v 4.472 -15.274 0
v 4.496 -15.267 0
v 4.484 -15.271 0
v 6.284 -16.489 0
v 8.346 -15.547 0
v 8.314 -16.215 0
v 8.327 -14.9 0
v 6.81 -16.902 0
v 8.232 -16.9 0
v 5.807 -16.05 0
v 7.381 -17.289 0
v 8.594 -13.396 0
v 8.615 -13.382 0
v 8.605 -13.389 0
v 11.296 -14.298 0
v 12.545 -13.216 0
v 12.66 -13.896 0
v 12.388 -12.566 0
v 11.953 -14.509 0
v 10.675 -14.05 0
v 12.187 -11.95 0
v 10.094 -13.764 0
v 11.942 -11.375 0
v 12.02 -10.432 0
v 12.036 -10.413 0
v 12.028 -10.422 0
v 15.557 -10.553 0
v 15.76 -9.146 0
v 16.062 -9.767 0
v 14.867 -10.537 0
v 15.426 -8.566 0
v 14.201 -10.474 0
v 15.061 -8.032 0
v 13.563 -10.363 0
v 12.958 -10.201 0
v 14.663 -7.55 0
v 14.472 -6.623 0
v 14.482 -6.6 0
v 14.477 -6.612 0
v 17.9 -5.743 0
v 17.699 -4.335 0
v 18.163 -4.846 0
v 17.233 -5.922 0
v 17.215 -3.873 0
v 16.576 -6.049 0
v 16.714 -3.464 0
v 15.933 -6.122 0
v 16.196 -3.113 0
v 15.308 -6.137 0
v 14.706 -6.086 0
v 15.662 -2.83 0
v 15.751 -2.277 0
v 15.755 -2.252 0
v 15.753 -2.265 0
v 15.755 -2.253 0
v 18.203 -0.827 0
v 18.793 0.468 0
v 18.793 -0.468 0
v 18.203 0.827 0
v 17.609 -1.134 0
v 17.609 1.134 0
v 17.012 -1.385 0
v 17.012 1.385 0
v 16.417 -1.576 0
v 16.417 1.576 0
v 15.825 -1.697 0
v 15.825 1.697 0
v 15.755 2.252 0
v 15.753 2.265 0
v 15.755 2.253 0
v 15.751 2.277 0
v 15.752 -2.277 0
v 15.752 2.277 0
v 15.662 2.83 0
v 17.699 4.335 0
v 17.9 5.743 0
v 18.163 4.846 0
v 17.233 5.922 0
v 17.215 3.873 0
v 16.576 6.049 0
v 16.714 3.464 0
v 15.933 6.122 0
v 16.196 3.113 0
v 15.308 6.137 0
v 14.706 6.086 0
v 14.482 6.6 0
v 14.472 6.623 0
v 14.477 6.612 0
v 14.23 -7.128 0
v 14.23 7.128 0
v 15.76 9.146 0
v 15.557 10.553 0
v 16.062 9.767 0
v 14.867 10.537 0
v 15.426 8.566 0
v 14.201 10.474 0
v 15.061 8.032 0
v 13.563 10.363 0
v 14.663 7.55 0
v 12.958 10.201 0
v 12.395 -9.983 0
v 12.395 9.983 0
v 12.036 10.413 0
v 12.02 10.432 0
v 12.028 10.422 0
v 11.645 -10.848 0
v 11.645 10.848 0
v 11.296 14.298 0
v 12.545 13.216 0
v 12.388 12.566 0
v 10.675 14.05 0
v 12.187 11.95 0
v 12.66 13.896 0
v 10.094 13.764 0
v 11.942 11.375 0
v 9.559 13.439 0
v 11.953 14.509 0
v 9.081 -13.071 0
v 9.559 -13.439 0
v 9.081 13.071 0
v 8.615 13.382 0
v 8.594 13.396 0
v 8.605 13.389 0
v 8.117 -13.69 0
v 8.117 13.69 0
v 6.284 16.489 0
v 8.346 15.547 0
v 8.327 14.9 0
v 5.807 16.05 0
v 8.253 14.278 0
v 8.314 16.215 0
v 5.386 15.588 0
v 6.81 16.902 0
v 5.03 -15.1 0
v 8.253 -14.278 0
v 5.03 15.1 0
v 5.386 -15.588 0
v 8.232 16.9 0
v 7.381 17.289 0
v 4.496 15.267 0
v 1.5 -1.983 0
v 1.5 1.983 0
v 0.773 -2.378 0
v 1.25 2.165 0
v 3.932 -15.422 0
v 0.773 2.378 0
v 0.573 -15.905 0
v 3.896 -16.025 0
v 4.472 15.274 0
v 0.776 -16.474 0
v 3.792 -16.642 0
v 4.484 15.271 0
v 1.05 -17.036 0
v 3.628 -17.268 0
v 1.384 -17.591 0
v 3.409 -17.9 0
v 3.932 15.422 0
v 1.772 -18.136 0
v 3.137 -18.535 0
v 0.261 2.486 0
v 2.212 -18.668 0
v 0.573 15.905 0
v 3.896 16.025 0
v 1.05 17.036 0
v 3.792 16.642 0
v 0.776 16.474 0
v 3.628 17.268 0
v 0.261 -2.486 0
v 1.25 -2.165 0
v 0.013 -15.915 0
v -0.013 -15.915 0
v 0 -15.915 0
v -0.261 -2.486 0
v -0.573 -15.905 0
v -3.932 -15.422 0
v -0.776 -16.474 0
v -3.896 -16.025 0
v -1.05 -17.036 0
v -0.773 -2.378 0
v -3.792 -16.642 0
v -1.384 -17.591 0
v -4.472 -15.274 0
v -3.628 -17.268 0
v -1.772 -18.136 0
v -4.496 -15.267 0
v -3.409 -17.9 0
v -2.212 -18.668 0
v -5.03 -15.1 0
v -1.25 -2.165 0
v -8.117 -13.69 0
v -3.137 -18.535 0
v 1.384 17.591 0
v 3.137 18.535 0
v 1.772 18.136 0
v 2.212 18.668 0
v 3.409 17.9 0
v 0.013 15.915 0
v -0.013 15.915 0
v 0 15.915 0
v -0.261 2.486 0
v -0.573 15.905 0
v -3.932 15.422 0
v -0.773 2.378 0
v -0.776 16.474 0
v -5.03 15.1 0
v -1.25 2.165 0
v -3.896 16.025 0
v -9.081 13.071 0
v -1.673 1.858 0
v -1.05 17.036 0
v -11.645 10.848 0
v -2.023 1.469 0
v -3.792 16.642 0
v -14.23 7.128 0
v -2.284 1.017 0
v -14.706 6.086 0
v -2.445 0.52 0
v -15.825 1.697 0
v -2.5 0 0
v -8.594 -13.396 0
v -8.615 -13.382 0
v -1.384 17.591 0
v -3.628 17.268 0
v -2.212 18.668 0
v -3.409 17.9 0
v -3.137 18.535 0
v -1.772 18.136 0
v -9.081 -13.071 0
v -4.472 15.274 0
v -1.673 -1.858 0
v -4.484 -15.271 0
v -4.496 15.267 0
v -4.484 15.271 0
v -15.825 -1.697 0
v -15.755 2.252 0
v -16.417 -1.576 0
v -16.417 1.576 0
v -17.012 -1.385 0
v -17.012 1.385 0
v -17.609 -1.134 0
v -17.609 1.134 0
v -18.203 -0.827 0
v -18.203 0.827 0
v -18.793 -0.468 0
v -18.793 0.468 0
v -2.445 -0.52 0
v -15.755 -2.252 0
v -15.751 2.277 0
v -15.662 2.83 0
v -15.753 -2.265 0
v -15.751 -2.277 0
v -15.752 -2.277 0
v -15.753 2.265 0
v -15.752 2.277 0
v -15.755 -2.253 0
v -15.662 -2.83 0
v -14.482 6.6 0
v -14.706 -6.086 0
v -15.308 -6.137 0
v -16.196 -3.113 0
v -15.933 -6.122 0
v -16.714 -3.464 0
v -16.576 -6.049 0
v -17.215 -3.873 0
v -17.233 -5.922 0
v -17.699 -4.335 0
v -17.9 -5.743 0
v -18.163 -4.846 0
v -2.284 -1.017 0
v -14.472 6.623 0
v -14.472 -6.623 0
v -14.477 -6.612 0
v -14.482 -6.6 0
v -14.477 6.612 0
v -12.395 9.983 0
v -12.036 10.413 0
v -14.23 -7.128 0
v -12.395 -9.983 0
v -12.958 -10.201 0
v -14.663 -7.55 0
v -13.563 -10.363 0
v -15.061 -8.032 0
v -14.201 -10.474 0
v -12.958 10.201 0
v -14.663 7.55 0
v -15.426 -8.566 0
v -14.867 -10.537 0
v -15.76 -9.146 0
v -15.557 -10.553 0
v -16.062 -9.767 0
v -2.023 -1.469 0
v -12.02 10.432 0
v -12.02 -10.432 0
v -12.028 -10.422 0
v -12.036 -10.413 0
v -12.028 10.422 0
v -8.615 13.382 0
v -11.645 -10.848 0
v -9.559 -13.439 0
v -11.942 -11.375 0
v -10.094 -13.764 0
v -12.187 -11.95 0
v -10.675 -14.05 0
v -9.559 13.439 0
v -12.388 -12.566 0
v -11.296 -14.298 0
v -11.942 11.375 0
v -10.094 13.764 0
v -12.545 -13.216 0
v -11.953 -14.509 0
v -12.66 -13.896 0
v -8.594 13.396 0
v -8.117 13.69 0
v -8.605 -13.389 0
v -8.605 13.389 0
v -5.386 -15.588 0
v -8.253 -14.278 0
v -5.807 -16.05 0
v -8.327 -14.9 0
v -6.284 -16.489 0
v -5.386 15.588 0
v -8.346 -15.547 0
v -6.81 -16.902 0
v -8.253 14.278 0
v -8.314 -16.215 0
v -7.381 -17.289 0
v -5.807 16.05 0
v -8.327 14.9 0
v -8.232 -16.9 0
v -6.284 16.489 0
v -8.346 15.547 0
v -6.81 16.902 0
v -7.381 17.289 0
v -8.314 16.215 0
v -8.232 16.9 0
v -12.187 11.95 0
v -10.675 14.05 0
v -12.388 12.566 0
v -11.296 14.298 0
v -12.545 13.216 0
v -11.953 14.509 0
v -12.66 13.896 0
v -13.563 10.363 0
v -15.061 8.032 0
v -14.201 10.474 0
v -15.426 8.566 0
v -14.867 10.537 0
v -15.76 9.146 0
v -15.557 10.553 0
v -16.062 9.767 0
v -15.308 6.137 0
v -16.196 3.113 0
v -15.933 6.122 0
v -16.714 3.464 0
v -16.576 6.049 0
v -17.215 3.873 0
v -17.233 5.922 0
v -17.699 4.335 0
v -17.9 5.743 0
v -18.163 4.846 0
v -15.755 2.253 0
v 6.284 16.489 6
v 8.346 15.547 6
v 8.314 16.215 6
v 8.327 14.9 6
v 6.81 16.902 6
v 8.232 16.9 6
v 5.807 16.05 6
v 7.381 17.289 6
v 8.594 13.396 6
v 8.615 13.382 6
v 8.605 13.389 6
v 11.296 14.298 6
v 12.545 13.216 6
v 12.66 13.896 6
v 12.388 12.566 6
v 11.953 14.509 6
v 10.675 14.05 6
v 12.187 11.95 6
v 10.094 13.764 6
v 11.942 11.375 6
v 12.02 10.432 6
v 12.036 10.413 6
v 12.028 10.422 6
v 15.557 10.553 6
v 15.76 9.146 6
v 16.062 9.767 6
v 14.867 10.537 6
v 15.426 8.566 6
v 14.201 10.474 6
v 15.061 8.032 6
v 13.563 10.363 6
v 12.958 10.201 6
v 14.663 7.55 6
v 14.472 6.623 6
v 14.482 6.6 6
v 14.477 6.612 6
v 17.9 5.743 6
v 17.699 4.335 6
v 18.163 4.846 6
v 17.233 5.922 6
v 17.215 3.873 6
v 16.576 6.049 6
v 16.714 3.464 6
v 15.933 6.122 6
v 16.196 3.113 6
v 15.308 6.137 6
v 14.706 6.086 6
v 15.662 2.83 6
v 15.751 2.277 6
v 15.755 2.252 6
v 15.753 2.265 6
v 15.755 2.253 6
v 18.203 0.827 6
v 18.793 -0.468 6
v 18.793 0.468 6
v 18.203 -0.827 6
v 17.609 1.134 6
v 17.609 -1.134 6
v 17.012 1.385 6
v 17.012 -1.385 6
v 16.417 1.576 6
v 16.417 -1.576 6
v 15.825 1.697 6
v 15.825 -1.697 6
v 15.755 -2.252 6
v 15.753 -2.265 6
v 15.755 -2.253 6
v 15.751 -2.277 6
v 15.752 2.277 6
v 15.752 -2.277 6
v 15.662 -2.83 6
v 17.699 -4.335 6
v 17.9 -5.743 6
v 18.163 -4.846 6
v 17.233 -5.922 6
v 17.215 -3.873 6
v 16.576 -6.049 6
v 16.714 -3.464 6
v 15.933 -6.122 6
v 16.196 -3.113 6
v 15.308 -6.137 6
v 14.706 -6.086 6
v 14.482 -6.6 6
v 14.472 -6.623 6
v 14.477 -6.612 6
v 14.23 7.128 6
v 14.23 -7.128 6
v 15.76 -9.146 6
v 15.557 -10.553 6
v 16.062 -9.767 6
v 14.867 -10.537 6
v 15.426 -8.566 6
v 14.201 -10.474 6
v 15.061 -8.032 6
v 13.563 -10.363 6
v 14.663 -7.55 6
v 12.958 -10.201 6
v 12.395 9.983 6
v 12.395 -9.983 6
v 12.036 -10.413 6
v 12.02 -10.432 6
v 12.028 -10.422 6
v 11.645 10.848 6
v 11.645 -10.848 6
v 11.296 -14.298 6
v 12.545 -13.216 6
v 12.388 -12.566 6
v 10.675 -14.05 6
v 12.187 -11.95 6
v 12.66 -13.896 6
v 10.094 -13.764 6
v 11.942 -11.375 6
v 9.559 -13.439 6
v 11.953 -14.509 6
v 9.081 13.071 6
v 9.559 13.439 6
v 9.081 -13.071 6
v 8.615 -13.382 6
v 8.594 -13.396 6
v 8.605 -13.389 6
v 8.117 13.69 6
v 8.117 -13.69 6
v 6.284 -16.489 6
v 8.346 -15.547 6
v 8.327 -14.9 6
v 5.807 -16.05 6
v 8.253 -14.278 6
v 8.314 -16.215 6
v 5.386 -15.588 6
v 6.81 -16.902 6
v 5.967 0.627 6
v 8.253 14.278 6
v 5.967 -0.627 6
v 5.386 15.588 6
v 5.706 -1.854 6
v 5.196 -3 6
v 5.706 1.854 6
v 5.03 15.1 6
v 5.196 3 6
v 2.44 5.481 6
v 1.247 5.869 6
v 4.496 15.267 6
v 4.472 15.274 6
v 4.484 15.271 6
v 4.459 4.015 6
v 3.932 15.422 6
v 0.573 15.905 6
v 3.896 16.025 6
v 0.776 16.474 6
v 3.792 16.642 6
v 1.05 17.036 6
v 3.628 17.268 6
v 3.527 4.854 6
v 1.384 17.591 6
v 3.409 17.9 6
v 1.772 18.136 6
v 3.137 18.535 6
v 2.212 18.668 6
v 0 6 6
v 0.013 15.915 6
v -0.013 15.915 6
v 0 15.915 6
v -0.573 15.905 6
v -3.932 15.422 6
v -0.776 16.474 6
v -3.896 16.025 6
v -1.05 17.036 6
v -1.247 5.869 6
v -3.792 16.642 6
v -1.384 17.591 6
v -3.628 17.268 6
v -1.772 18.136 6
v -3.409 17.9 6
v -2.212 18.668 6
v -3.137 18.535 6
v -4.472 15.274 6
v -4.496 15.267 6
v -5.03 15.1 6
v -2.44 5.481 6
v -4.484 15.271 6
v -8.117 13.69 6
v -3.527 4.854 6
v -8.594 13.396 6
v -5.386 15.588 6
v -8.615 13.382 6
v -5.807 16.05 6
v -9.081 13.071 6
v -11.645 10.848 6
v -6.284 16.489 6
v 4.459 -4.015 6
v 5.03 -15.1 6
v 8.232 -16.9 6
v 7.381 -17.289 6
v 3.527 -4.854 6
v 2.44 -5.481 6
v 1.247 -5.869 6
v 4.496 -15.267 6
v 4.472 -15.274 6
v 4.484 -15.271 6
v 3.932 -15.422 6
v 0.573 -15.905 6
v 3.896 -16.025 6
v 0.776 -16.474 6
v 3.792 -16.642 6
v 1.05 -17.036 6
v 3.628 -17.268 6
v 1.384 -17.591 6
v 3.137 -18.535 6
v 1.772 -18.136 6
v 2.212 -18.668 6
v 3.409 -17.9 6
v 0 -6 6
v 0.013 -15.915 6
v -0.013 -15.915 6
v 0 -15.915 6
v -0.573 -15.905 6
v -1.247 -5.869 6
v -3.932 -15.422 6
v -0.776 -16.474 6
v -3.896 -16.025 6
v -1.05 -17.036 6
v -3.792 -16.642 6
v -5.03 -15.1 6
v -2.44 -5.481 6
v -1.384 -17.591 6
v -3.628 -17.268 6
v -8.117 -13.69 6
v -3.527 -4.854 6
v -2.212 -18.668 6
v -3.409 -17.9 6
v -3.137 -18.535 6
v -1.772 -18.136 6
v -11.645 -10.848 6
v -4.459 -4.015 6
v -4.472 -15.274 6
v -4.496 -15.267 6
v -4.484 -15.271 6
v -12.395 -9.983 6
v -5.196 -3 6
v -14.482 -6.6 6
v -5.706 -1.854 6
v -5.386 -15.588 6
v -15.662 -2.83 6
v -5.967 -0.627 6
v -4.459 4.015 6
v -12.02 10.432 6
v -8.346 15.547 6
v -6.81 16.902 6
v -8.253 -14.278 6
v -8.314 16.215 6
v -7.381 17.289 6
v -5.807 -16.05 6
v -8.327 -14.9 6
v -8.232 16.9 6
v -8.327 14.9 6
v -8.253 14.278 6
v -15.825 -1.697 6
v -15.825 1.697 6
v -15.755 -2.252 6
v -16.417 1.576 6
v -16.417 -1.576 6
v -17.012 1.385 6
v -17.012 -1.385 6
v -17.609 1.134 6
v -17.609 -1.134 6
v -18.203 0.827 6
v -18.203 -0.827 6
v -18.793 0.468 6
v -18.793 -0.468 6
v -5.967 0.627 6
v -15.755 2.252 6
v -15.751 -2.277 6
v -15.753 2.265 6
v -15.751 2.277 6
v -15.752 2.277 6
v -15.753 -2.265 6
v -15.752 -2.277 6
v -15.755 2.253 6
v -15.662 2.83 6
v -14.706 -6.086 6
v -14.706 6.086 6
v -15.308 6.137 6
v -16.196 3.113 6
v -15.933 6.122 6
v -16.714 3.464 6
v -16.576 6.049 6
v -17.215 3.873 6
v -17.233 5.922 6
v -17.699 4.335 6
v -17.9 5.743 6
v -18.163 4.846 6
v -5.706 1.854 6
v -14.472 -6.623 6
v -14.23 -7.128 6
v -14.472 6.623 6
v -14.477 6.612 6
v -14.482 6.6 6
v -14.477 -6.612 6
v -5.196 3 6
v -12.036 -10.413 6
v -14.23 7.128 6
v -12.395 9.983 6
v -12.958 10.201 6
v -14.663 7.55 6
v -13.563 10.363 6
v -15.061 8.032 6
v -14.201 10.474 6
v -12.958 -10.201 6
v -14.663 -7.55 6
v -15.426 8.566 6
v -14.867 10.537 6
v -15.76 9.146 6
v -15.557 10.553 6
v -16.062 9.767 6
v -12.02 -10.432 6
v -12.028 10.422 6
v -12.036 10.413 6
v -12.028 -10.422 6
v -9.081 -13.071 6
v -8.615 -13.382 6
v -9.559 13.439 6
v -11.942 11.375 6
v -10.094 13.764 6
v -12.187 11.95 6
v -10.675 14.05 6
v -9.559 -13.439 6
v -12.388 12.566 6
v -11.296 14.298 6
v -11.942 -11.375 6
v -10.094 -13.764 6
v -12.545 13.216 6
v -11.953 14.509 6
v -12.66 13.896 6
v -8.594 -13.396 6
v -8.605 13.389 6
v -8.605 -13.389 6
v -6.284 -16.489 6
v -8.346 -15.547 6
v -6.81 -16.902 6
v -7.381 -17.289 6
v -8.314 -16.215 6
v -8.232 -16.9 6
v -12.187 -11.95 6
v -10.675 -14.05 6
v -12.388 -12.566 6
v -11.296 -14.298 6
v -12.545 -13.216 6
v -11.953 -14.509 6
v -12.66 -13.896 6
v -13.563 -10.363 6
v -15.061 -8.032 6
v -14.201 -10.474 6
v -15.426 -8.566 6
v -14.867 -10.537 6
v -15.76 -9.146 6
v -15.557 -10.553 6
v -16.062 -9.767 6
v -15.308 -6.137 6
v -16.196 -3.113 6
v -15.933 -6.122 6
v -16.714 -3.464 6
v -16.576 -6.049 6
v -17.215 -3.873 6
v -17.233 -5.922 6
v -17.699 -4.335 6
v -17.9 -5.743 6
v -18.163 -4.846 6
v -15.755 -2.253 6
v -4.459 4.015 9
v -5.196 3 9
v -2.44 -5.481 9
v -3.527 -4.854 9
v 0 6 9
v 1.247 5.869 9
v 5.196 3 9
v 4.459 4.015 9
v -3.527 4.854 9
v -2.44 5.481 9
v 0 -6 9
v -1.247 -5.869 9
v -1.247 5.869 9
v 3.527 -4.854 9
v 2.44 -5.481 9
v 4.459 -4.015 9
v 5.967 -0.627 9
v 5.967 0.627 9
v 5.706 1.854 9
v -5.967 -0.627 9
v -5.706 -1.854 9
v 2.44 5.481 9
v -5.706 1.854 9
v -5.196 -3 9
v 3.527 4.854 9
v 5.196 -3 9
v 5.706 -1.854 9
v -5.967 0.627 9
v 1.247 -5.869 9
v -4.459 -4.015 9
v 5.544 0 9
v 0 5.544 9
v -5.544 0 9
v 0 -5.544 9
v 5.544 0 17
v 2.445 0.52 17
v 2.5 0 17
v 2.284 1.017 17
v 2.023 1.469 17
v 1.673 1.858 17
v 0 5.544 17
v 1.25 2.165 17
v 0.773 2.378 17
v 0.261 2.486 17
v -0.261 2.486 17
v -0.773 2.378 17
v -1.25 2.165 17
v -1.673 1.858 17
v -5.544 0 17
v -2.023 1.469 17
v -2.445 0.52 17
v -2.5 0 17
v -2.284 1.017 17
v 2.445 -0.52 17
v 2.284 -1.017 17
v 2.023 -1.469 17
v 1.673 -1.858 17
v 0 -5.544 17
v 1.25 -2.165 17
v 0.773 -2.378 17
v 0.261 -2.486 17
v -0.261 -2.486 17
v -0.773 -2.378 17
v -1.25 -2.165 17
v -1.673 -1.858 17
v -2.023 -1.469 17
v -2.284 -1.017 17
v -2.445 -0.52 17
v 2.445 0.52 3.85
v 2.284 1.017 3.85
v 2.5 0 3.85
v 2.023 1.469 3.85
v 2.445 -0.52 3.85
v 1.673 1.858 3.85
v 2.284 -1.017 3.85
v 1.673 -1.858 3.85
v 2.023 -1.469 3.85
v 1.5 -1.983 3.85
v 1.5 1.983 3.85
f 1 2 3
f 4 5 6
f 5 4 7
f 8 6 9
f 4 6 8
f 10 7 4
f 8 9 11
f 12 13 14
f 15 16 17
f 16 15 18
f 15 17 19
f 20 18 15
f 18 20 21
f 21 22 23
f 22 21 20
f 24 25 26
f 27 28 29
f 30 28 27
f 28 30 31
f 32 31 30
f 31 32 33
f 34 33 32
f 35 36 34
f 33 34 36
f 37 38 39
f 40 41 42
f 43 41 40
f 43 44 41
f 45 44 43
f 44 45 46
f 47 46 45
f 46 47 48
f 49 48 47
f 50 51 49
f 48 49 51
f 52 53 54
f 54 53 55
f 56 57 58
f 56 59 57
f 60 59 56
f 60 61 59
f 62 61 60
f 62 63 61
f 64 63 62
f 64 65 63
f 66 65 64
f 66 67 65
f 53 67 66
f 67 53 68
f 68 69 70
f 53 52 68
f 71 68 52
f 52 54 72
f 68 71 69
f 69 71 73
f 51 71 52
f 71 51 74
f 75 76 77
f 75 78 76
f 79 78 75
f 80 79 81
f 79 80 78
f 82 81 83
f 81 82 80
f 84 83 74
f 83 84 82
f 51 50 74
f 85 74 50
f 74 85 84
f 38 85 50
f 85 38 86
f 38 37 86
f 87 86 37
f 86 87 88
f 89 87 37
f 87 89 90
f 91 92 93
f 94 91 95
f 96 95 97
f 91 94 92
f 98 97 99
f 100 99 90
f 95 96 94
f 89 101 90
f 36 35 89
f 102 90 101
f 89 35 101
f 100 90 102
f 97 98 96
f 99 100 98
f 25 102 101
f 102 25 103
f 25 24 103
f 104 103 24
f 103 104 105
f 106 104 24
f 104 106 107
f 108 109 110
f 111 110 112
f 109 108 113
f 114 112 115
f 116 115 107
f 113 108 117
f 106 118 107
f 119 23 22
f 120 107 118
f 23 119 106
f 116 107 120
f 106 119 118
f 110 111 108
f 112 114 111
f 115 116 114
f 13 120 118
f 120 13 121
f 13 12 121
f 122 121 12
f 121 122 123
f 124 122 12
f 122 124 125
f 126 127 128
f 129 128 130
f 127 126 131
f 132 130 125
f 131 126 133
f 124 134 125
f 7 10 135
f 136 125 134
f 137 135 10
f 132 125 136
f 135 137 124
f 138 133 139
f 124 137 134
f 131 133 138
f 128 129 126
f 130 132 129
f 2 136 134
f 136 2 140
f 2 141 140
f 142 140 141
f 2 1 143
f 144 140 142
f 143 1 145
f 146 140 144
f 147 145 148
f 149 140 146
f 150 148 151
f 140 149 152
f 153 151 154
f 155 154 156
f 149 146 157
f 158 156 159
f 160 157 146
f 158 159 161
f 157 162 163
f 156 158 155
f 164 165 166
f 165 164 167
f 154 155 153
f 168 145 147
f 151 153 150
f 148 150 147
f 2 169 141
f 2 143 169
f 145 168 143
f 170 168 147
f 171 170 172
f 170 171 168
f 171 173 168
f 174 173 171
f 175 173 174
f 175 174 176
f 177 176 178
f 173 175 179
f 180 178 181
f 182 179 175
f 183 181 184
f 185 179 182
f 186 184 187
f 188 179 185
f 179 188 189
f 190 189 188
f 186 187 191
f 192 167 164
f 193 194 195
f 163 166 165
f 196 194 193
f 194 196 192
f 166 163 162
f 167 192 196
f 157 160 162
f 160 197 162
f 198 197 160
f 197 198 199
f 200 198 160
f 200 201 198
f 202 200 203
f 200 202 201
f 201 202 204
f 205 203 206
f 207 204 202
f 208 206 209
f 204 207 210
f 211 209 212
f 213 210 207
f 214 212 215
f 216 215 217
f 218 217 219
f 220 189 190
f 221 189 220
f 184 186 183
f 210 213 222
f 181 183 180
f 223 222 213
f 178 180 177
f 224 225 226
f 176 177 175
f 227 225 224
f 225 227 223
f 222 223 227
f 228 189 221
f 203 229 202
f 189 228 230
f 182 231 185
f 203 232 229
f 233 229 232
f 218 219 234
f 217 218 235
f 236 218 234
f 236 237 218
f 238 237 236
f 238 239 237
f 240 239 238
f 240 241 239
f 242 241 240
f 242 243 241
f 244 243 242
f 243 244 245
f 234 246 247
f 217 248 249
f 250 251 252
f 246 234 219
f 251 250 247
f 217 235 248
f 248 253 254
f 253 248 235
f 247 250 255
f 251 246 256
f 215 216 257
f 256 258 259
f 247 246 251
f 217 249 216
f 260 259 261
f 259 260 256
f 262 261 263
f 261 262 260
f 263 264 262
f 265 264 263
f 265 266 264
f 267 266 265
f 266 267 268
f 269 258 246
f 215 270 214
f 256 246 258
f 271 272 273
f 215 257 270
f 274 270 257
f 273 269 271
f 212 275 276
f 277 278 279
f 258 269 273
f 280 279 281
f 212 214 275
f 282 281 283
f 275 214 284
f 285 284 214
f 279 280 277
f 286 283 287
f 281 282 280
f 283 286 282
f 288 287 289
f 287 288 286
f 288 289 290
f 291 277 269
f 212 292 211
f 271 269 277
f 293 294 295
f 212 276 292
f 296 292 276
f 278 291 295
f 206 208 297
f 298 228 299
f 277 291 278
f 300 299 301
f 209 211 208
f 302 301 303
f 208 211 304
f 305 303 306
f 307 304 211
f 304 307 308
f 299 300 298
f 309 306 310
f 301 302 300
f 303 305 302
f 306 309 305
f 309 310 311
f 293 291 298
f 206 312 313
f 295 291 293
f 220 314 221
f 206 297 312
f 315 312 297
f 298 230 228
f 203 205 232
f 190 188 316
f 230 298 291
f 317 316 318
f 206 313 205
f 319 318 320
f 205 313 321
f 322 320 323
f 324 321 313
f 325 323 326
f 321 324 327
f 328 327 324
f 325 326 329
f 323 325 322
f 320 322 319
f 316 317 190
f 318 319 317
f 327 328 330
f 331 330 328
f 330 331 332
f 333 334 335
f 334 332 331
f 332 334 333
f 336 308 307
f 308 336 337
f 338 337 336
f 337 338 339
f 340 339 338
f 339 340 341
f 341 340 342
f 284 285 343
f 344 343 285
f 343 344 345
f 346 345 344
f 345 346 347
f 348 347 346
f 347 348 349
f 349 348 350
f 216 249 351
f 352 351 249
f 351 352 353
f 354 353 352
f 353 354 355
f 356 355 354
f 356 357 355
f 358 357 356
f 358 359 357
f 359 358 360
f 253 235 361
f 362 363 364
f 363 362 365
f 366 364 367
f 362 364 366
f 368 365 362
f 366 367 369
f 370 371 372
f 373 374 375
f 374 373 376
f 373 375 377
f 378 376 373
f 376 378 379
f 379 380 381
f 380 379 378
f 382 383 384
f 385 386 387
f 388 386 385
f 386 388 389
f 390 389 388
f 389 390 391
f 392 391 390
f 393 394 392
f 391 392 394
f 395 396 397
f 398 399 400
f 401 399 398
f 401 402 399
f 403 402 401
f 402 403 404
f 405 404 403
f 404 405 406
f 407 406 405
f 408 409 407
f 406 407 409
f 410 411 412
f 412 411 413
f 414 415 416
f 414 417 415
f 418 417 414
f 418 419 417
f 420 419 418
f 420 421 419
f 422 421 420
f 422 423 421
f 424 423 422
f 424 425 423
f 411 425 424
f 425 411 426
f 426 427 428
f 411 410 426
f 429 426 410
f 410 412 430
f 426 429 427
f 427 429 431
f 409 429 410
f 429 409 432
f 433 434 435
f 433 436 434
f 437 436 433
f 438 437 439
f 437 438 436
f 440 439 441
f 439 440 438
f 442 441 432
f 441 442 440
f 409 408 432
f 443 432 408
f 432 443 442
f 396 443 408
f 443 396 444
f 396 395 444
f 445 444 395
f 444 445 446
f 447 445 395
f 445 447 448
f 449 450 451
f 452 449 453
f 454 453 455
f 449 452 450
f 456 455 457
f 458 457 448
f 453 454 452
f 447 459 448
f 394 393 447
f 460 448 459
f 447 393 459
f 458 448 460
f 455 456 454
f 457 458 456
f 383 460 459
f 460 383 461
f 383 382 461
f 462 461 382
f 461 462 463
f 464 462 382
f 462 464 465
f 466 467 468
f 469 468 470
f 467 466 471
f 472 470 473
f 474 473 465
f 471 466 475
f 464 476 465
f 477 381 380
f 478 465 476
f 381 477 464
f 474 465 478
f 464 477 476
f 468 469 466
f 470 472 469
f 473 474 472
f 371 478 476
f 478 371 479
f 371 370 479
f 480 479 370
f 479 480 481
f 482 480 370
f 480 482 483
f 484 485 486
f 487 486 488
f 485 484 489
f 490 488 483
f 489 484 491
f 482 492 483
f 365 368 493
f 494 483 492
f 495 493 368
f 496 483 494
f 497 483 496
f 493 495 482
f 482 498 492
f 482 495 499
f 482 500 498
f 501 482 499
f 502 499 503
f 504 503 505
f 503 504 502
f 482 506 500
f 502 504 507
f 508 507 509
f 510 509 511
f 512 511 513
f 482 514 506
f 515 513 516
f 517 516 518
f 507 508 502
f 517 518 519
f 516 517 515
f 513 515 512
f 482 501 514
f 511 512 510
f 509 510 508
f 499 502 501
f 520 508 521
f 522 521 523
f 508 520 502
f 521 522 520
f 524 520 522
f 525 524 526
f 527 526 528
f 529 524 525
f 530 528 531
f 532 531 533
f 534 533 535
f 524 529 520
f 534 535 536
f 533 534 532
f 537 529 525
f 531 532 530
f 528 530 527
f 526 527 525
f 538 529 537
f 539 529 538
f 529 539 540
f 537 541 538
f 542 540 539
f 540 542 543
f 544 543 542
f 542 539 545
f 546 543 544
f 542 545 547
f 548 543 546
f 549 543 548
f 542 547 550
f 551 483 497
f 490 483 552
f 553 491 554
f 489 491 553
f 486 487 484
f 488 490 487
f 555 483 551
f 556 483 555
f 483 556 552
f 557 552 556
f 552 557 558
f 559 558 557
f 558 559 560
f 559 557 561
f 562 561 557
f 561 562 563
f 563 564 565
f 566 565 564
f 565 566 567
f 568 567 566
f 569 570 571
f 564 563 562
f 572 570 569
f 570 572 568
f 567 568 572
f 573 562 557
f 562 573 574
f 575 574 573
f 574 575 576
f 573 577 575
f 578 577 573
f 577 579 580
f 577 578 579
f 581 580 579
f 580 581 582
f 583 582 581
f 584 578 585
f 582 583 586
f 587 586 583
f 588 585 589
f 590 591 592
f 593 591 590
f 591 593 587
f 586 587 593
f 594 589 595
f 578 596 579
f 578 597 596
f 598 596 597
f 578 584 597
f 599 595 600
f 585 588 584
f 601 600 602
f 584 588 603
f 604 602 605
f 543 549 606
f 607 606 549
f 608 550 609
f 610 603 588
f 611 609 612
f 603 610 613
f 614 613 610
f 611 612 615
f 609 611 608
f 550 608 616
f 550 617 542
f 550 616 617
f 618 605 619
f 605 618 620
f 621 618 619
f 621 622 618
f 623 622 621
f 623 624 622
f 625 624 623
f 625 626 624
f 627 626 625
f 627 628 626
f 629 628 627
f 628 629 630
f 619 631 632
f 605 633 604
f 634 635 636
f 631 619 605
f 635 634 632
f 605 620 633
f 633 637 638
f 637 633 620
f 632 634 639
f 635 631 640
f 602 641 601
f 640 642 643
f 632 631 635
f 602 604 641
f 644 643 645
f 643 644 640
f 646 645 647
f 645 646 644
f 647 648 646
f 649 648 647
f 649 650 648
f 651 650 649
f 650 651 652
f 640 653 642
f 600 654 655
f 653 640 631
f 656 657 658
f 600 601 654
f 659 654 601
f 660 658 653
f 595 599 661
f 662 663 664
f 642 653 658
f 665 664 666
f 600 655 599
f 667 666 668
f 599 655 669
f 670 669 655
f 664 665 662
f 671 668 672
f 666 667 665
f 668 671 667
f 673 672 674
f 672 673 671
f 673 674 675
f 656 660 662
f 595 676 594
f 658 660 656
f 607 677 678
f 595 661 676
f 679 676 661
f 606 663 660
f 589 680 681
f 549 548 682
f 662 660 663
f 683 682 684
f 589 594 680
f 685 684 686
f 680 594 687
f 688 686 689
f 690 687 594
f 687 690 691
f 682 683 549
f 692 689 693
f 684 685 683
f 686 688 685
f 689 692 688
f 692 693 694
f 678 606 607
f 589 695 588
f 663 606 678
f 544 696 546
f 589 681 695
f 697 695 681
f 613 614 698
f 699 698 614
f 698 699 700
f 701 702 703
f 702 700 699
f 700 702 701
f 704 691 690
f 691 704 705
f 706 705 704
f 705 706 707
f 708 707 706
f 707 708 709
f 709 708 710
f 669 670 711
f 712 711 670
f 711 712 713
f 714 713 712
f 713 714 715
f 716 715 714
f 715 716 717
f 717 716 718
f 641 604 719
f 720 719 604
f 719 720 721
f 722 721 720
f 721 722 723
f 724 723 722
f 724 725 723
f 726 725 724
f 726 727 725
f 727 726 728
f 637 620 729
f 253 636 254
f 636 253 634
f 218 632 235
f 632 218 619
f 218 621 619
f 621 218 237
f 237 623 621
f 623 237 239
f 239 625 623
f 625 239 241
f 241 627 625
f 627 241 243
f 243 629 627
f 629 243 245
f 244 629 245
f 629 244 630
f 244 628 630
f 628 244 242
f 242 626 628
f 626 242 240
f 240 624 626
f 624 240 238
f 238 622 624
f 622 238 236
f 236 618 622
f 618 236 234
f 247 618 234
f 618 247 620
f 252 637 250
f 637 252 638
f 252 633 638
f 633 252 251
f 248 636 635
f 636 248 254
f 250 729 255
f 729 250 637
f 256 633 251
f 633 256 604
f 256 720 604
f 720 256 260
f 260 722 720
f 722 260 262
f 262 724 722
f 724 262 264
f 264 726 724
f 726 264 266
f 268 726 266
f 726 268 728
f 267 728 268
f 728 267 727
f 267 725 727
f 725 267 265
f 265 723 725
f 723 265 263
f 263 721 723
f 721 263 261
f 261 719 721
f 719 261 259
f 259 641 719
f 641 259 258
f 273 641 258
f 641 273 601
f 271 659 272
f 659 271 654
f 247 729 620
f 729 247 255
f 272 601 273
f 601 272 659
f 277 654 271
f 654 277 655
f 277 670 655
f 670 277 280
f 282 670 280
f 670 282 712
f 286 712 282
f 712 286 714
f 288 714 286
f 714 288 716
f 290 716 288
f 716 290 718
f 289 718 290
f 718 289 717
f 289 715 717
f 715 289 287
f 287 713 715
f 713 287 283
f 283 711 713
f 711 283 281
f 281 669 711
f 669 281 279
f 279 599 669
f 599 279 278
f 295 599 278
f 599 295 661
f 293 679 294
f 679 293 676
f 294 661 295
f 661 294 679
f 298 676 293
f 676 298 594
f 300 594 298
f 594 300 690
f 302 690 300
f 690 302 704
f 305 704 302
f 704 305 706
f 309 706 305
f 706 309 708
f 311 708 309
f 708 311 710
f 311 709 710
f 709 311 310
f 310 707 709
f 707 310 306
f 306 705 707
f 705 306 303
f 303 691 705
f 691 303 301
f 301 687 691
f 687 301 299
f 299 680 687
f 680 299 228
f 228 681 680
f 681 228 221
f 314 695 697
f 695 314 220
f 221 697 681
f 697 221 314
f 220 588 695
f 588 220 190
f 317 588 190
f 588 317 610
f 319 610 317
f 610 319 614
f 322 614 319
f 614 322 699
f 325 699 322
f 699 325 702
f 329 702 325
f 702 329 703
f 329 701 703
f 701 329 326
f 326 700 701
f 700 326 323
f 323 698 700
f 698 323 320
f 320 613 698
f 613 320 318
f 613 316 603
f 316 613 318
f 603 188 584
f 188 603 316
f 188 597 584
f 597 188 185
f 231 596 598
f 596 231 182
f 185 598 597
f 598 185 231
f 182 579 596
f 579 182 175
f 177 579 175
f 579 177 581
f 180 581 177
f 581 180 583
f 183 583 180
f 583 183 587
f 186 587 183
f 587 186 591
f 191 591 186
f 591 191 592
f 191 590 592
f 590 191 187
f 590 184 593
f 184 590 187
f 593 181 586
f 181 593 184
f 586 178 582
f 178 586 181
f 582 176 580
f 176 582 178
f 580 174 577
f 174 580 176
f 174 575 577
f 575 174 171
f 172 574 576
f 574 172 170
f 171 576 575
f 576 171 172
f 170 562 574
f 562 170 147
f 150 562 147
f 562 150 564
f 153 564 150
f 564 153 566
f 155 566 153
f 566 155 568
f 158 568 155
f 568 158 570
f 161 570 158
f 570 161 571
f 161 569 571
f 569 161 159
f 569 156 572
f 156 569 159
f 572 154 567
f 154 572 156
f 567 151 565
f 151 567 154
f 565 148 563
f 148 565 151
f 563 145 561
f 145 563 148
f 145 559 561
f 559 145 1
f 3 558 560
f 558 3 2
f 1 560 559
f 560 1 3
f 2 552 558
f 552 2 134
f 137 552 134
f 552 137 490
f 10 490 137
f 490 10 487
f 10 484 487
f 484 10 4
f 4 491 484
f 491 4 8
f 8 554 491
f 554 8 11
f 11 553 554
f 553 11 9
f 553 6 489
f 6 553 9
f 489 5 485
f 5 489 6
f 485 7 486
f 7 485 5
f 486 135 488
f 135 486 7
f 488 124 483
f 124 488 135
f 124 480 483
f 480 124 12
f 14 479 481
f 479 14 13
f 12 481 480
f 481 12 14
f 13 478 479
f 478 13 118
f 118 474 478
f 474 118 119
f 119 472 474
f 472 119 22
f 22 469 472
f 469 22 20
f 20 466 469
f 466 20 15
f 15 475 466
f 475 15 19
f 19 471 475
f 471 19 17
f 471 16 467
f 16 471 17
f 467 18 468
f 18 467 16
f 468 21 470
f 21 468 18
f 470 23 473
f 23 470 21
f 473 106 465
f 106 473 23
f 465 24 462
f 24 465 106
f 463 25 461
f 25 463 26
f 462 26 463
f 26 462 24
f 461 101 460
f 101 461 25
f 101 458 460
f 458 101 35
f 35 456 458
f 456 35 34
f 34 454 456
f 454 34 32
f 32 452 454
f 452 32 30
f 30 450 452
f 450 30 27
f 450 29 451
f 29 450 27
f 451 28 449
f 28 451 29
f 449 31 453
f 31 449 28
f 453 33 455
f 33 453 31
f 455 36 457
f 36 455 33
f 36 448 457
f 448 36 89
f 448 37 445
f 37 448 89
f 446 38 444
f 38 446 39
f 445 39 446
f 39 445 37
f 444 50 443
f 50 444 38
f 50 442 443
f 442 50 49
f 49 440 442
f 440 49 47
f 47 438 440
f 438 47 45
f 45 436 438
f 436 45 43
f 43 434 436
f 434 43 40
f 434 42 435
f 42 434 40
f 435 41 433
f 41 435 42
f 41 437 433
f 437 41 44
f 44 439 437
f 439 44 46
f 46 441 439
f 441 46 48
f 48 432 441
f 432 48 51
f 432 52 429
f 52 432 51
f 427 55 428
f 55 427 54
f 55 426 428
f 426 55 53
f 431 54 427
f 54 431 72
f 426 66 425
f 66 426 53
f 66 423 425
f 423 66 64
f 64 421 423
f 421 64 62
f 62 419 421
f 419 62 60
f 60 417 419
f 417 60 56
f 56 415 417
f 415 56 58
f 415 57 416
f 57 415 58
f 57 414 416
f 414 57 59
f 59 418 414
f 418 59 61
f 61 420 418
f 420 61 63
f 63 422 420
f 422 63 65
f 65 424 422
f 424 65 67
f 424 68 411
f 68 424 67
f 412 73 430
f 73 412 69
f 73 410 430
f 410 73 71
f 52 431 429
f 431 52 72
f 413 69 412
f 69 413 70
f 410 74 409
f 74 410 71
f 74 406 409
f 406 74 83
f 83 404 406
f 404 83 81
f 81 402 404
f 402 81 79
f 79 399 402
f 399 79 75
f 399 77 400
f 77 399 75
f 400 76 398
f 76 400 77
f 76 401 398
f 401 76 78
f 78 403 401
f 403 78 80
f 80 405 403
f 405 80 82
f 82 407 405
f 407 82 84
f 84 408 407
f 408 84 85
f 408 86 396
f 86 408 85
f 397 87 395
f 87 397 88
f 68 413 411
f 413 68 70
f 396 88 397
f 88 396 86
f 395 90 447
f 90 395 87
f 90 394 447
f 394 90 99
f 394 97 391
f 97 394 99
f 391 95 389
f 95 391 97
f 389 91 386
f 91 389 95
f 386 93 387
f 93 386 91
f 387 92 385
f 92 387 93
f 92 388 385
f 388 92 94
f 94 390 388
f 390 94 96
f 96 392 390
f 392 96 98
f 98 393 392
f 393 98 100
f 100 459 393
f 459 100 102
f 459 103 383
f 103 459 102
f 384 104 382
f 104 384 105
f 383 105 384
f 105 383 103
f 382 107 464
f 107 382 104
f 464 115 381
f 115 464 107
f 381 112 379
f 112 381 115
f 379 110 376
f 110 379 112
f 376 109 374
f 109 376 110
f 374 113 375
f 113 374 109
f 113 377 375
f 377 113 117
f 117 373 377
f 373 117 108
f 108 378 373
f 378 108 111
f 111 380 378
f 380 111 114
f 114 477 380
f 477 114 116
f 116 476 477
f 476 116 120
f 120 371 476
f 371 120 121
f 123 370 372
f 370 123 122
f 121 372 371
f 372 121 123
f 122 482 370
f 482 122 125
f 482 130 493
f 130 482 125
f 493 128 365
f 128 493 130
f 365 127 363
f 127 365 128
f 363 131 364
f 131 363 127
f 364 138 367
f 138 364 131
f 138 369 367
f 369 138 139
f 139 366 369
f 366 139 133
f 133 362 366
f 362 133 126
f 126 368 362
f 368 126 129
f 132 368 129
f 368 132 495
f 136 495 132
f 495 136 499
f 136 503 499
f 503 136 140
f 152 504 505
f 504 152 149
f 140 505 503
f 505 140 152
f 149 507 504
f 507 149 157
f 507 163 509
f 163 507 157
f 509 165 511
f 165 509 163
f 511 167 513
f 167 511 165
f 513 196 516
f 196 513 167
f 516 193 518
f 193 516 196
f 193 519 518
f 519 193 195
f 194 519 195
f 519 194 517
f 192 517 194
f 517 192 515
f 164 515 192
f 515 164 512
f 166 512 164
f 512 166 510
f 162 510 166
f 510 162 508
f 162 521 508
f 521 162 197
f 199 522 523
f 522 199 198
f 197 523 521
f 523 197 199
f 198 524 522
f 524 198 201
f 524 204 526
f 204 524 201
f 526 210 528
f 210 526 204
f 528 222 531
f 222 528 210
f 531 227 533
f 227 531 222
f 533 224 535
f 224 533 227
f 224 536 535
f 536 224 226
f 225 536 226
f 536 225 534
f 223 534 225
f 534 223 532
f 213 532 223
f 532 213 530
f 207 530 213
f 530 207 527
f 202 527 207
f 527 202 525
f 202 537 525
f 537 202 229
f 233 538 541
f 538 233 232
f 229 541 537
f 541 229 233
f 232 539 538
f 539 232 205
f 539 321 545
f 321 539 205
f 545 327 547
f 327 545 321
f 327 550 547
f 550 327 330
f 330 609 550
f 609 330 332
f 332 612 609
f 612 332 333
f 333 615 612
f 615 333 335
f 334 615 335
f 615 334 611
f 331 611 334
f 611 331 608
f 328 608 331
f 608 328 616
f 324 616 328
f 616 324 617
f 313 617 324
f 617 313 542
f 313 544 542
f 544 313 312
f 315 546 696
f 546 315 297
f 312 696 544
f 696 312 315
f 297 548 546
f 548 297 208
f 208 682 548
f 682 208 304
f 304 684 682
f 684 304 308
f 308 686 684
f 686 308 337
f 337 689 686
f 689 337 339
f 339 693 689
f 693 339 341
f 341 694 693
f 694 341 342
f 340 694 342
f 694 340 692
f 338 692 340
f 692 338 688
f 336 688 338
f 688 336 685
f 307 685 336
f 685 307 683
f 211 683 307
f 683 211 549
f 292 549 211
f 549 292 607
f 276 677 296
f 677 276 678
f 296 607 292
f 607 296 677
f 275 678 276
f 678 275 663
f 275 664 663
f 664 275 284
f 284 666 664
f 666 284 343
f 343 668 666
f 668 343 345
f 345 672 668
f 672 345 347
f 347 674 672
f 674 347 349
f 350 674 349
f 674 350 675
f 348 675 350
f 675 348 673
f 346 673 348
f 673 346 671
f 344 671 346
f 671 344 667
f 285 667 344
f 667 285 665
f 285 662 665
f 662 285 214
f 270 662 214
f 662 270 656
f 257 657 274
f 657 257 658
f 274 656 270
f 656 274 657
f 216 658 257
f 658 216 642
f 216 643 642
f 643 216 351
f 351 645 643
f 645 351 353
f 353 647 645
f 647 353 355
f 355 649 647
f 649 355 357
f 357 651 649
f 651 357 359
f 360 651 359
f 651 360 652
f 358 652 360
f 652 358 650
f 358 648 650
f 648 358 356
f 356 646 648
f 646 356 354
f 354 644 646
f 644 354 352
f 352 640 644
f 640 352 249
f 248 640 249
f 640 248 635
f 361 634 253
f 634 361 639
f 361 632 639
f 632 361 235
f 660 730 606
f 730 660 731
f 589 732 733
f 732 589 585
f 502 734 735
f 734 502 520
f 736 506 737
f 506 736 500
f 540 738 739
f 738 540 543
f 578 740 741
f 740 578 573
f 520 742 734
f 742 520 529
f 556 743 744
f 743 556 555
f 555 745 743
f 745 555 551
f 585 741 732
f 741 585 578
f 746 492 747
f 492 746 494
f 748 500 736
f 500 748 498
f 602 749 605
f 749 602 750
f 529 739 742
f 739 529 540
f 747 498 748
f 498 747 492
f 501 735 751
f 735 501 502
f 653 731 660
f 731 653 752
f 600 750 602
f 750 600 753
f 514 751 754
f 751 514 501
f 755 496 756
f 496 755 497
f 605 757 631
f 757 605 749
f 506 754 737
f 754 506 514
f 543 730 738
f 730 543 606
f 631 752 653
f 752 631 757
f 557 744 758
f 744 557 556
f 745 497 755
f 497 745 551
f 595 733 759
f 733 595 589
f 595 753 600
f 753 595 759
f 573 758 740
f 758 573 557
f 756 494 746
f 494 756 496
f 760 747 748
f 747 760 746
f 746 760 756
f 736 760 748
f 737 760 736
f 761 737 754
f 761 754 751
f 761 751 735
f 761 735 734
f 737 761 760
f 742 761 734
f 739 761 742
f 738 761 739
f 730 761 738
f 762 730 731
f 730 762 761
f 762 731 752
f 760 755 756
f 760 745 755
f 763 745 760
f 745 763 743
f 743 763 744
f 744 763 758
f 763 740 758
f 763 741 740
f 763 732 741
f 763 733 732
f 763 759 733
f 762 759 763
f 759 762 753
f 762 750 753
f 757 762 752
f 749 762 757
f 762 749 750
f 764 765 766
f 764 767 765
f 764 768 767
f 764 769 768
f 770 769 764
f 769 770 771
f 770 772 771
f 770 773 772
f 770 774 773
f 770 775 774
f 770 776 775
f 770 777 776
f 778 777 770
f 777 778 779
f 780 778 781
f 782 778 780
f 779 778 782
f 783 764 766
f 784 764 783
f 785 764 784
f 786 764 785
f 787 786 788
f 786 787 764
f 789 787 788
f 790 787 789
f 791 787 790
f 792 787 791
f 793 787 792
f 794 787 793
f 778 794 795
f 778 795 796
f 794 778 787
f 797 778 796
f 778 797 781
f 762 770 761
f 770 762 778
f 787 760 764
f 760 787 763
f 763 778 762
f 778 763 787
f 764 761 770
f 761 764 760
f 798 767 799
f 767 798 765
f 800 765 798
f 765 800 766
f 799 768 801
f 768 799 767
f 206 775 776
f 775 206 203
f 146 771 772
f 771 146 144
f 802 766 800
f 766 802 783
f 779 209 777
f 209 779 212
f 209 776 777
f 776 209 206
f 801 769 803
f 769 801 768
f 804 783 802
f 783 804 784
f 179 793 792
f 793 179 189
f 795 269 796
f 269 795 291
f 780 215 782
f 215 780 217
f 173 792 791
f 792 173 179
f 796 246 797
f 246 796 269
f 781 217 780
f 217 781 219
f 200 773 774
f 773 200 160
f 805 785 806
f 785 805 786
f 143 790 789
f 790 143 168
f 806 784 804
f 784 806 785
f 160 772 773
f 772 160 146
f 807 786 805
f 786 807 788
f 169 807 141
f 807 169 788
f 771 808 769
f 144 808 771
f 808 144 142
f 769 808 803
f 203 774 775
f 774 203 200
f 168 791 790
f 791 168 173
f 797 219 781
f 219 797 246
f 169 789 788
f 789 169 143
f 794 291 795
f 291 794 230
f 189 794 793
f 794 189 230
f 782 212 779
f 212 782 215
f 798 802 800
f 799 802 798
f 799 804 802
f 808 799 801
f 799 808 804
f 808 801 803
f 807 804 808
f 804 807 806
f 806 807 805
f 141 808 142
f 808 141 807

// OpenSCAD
//===========================================
//   Public Domain Roots Blower in OpenSCAD
//   version 1.0
//   by Matt Moses, 2011, mmoses152@gmail.com
//   http://www.thingiverse.com/thing:8068
//
//   This file is public domain.  Use it for any purpose, including commercial
//   applications.  Attribution would be nice, but is not required.  There is
//   no warranty of any kind, including its correctness, usefulness, or safety.
//
//   See http://en.wikipedia.org/wiki/Roots_type_supercharger
//
//   This file uses code appropriated from 
//   Leemon Baird's PublicDomainGearV1.1.scad
//   which can be found here:
//   http://www.thingiverse.com/thing:5505
//
//===========================================


//===========================================
// General stuff
pi = 3.1415926;
$fn = 30; // facet resolution
alpha = 180 * $t; // for animation
//===========================================


//===========================================
// Note: The gears are offset by 90 degrees.  
// For them to mesh with this phasing, they need to have
// number of teeth = 4*n + 2, where n is an integer.  
// First few options are 6, 10, 14, 18, 22, 26, 30...
//
// The gear parameters determine the rotor parameters, 
// so let's start by defining them:
//
mm_per_tooth = 5; // for timing gears
number_of_teeth = 22; // for timing gears, pick one: 6, 10, 14, 18, 22, 26, etc.
thickness = 6; 
hole_diameter = 0;
twist = 0;
teeth_to_hide = 0;
pressure_angle = 28;
clearance = 0.3;
backlash = 0.2;
//===========================================


//===========================================
// Now determine and/or set the rotor parameters
r =  mm_per_tooth * number_of_teeth / pi / 8; // this is one quarter of pitch radius of timing gears
R = 4*r; // big R for eip- and hypo- trochoid shapes in rotor

echo(6*R); // this is the length of the long side of the housing (assumed to be in mm)

rotor_thickness = 8;
n_wedge = 20; // number of wedges in a rotor quadrant
r_bore = 4; // half-side of square rotor bore
rotor_twist = 10;
shaft_dia = 12;
shaft_length = 3;
//===========================================


//===========================================
// Now let's assemble the mechanism.
//
// First the Left Rotor
//
/*color([0.2, 0.7, 0.2])
translate([-R, 0, 0]) // shaft_length]) 
	rotate([0, 0, alpha]) 
		rootsRotor(R, r, r, 4*n_wedge, n_wedge, rotor_thickness, r_bore,  rotor_twist);

// Next the Right Rotor
//
color([0.2, 0.5, 0.5])
translate([R, 0, 0]) // shaft_length]) 
	rotate([0, 0, -alpha]) 
		rootsRotor(R, r, r, 4*n_wedge, n_wedge, rotor_thickness, r_bore,  -rotor_twist);
*/
// Now place the Timing Gears
//
//color([0.3, 0.3, 0.5]){
//translate([R, 0, -thickness/2]) {
difference(){
  translate([0, 0, thickness/2]) {
          rotate([0, 0, 90-alpha]) {
                  gearshaft ( mm_per_tooth, number_of_teeth, thickness,  
                          hole_diameter, twist, teeth_to_hide,   
                          pressure_angle, clearance, backlash,
                          shaft_dia, shaft_length, r_bore, rotor_thickness);
          }
  }
  difference(){
    translate([0, 0, -0.1]) cylinder(r = 2.5, h = 30, $f = 100);
    translate([1.5, -4, -0.15]) cube([10,10,thickness-2]);
  }
}
/*
translate([-R, 0, -thickness/2]) {
	rotate([0, 0, alpha]) {
		gearshaft ( mm_per_tooth, number_of_teeth, thickness,  
			hole_diameter, twist, teeth_to_hide,   
			pressure_angle, clearance, backlash,
			shaft_dia, shaft_length, r_bore, rotor_thickness);
	}
}
}

// And last the housing and coverplate (if desired)
//
housing(R, shaft_length, shaft_dia, rotor_thickness);
//coverplate(R, shaft_length, shaft_dia, rotor_thickness);
//
//===========================================
*/

//===========================================
// This section places individual parts so they can be 
// easily exported as STL.  Comment or uncomment each 
// sub-section as needed.
// NOTE: The twisted rotors crash OpenSCAD during "Compile and Render"
// There are probably not unioned correctly...
// The no-twist rotor exports to STL fine.


// Left Rotor
//rootsRotor(R, r, r, 4*n_wedge, n_wedge, rotor_thickness, r_bore,  rotor_twist);

// Right Rotor
//rootsRotor(R, r, r, 4*n_wedge, n_wedge, rotor_thickness, r_bore,  -rotor_twist);

// No-Twist Rotor
//rootsRotor(R, r, r, 4*n_wedge, n_wedge, rotor_thickness, r_bore,  0);

//// Gearshaft
//translate([0, 0, thickness/2])
//gearshaft ( mm_per_tooth, number_of_teeth, thickness,  
//	hole_diameter, twist, teeth_to_hide,   
//	pressure_angle, clearance, backlash,
//	shaft_dia, shaft_length, r_bore, rotor_thickness);

// Housing
//housing(R, shaft_length, shaft_dia, rotor_thickness);

//// Coverplate
//translate([0, 0, -1.01*rotor_thickness - 0.99*shaft_length])
//coverplate(R, shaft_length, shaft_dia, rotor_thickness);

//===========================================


//===========================================
// Gearshaft Module
//
module gearshaft ( mm_per_tooth, number_of_teeth, thickness,  
			hole_diameter, twist, teeth_to_hide,   
			pressure_angle, clearance, backlash,
			shaft_dia, shaft_length, r_bore, rotor_thickness){
union() {
	gear ( mm_per_tooth, number_of_teeth, thickness,  
	hole_diameter, twist, teeth_to_hide,   
	pressure_angle, clearance, backlash);
	
	translate([0, 0, thickness/2 + shaft_length/2]) 
		cylinder (h = shaft_length, r = shaft_dia/2, center = true);

	translate([0, 0, thickness/2 + shaft_length + rotor_thickness/2])
		rotate([0, 0, 45])
			cube([0.98 * 2 * r_bore, 0.98 * 2 * r_bore, rotor_thickness], center = true);

}
}
//===========================================


//===========================================
// Housing Module
//
module housing (R, shaft_length, shaft_dia, rotor_thickness) {
l_housing = 6*R;
w_housing = 4*R;
h_housing = 1.01 * rotor_thickness;
h_backplate = 0.99 * shaft_length;
h_total = h_housing + h_backplate;

color([0.7, 0, 0.4]) {
difference() {
	union() {
		translate([0, 0, h_backplate/2])
			cube([l_housing, w_housing, h_backplate], center = true);

		difference(){
			translate([0, 0, h_housing/2 + h_backplate])
				cube([l_housing, w_housing, h_housing], center = true);
			translate([-R, 0, h_housing/2 + h_backplate]) 
				cylinder(h = 1.1*rotor_thickness, r = 1.01*1.5*R, center = true);
			translate([R, 0, h_housing/2 + h_backplate]) 
				cylinder(h = 1.1*rotor_thickness, r = 1.01*1.5*R, center = true);
		}
	}
	//translate([0, sqrt( 1.01*1.01*1.5*1.5 - 1)*R, h_total/2])
	//	cylinder(r = R/6, h = 1.1*h_total, center = true);
	translate([0, 0,1.1* h_housing/2 + h_backplate])
		cube([R/6, 1.1*w_housing, 1.1*h_housing], center = true);
	translate([-R, 0, h_backplate/2 ])
		cylinder(r = 1.05 * shaft_dia/2, h = 1.1*h_backplate, center = true);
	translate([R, 0, h_backplate/2 ])
		cylinder(r = 1.05 * shaft_dia/2, h = 1.1*h_backplate, center = true);
	
}
}
}
//===========================================


//===========================================
// Coverplate Module
//
module coverplate (R, shaft_length, shaft_dia, rotor_thickness) {
l_housing = 6*R;
w_housing = 4*R;
h_housing = 1.01 * rotor_thickness;
h_backplate = 0.99 * shaft_length;
h_total = h_housing + h_backplate;
h_coverplate = 3;

color([0.2, 0.5, 0.3]) 
translate([0, 0, h_coverplate/2 + h_total])
	cube([l_housing, w_housing, h_coverplate], center = true);
}
//===========================================


//===========================================
// Roots Rotor Module
//
module rootsRotor(R, r, d, n, p, thickness, rad_bore, twist) {
	difference() {
	union() {
		hypotrochoidLinear(R, r, d, n, p, thickness, twist);
		rotate([0, 0, 90]) epitrochoidLinear(R, r, d, n, p, thickness, twist);
		rotate([0, 0, 180]) hypotrochoidLinear(R, r, d, n, p, thickness, twist);
		rotate([0, 0, 270]) epitrochoidLinear(R, r, d, n, p, thickness, twist);
	}
	translate([0, 0, thickness/2]) rotate([0, 0, 45]) cube([2*rad_bore,2* rad_bore, 1.1*thickness], center = true);
}
}
//===========================================


//===========================================
// Epitrochoid Wedge, Linear Extrude
//
module epitrochoidLinear(R, r, d, n, p, thickness, twist) {
	dth = 360/n;
	linear_extrude(height = thickness, convexity = 10, twist = twist) {
	union() {
	for ( i = [0:p-1] ) {
			polygon(points = [[0, 0], 
			[(R+r)*cos(dth*i) - d*cos((R+r)/r*dth*i), (R+r)*sin(dth*i) - d*sin((R+r)/r*dth*i)], 
			[(R+r)*cos(dth*(i+1)) - d*cos((R+r)/r*dth*(i+1)), (R+r)*sin(dth*(i+1)) - d*sin((R+r)/r*dth*(i+1))]], 
			paths = [[0, 1, 2]], convexity = 10); 
	}
	}
	}
}
//===========================================


//===========================================
// Hypotrochoid Wedge, Linear Extrude
//
module hypotrochoidLinear(R, r, d, n, p, thickness, twist) {
	dth = 360/n;
	linear_extrude(height = thickness, convexity = 10, twist = twist) {
	union() {
	for ( i = [0:p-1] ) {
			polygon(points = [[0, 0], 
			[(R-r)*cos(dth*i) + d*cos((R-r)/r*dth*i), (R-r)*sin(dth*i) - d*sin((R-r)/r*dth*i)], 
			[(R-r)*cos(dth*(i+1)) + d*cos((R-r)/r*dth*(i+1)), (R-r)*sin(dth*(i+1)) - d*sin((R-r)/r*dth*(i+1))]],
			paths = [[0, 1, 2]], convexity = 10); 
	}
	}
	}
}
//===========================================


//===========================================
//   This gear() module is from 
//   Leemon Baird's PublicDomainGearV1.1.scad
//   which can be found here:
//   http://www.thingiverse.com/thing:5505
//An involute spur gear, with reasonable defaults for all the parameters.
//Normally, you should just choose the first 4 parameters, and let the rest be default values.
//Meshing gears must match in mm_per_tooth, pressure_angle, and twist,
//and be separated by the sum of their pitch radii, which can be found with pitch_radius().
module gear (
	mm_per_tooth    = 3,    //this is the "circular pitch", the circumference of the pitch circle divided by the number of teeth
	number_of_teeth = 11,   //total number of teeth around the entire perimeter
	thickness       = 6,    //thickness of gear in mm
	hole_diameter   = 3,    //diameter of the hole in the center, in mm
	twist           = 0,    //teeth rotate this many degrees from bottom of gear to top.  360 makes the gear a screw with each thread going around once
	teeth_to_hide   = 0,    //number of teeth to delete to make this only a fraction of a circle
	pressure_angle  = 28,   //Controls how straight or bulged the tooth sides are. In degrees.
	clearance       = 0.0,  //gap between top of a tooth on one gear and bottom of valley on a meshing gear (in millimeters)
	backlash        = 0.0   //gap between two meshing teeth, in the direction along the circumference of the pitch circle
) {
	assign(pi = 3.1415926)
	assign(p  = mm_per_tooth * number_of_teeth / pi / 2)  //radius of pitch circle
	assign(c  = p + mm_per_tooth / pi - clearance)        //radius of outer circle
	assign(b  = p*cos(pressure_angle))                    //radius of base circle
	assign(r  = p-(c-p)-clearance)                        //radius of root circle
	assign(t  = mm_per_tooth/2-backlash/2)                //tooth thickness at pitch circle
	assign(k  = -iang(b, p) - t/2/p/pi*180) {             //angle to where involute meets base circle on each side of tooth
		difference() {
			for (i = [0:number_of_teeth-teeth_to_hide-1] )
				rotate([0,0,i*360/number_of_teeth])
					linear_extrude(height = thickness, center = true, convexity = 10, twist = twist)
						polygon(
							points=[
								[0, -hole_diameter/10],
								polar(r, -181/number_of_teeth),
								polar(r, r<b ? k : -180/number_of_teeth),
								q7(0/5,r,b,c,k, 1),q7(1/5,r,b,c,k, 1),q7(2/5,r,b,c,k, 1),q7(3/5,r,b,c,k, 1),q7(4/5,r,b,c,k, 1),q7(5/5,r,b,c,k, 1),
								q7(5/5,r,b,c,k,-1),q7(4/5,r,b,c,k,-1),q7(3/5,r,b,c,k,-1),q7(2/5,r,b,c,k,-1),q7(1/5,r,b,c,k,-1),q7(0/5,r,b,c,k,-1),
								polar(r, r<b ? -k : 180/number_of_teeth),
								polar(r, 181/number_of_teeth)
							],
 							paths=[[0,1,2,3,4,5,6,7,8,9,10,11,12,13,14,15,16]]
						);
			cylinder(h=2*thickness+1, r=hole_diameter/2, center=true, $fn=20);
		}
	}
};	
//these 4 functions are used by gear
function polar(r,theta)   = r*[sin(theta), cos(theta)];                            //convert polar to cartesian coordinates
function iang(r1,r2)      = sqrt((r2/r1)*(r2/r1) - 1)/3.1415926*180 - acos(r1/r2); //unwind a string this many degrees to go from radius r1 to radius r2
function q7(f,r,b,r2,t,s) = q6(b,s,t,(1-f)*max(b,r)+f*r2);                         //radius a fraction f up the curved side of the tooth 
function q6(b,s,t,d)      = polar(d,s*(iang(b,d)+t));                              //point at radius d on the involute curve
//===========================================
